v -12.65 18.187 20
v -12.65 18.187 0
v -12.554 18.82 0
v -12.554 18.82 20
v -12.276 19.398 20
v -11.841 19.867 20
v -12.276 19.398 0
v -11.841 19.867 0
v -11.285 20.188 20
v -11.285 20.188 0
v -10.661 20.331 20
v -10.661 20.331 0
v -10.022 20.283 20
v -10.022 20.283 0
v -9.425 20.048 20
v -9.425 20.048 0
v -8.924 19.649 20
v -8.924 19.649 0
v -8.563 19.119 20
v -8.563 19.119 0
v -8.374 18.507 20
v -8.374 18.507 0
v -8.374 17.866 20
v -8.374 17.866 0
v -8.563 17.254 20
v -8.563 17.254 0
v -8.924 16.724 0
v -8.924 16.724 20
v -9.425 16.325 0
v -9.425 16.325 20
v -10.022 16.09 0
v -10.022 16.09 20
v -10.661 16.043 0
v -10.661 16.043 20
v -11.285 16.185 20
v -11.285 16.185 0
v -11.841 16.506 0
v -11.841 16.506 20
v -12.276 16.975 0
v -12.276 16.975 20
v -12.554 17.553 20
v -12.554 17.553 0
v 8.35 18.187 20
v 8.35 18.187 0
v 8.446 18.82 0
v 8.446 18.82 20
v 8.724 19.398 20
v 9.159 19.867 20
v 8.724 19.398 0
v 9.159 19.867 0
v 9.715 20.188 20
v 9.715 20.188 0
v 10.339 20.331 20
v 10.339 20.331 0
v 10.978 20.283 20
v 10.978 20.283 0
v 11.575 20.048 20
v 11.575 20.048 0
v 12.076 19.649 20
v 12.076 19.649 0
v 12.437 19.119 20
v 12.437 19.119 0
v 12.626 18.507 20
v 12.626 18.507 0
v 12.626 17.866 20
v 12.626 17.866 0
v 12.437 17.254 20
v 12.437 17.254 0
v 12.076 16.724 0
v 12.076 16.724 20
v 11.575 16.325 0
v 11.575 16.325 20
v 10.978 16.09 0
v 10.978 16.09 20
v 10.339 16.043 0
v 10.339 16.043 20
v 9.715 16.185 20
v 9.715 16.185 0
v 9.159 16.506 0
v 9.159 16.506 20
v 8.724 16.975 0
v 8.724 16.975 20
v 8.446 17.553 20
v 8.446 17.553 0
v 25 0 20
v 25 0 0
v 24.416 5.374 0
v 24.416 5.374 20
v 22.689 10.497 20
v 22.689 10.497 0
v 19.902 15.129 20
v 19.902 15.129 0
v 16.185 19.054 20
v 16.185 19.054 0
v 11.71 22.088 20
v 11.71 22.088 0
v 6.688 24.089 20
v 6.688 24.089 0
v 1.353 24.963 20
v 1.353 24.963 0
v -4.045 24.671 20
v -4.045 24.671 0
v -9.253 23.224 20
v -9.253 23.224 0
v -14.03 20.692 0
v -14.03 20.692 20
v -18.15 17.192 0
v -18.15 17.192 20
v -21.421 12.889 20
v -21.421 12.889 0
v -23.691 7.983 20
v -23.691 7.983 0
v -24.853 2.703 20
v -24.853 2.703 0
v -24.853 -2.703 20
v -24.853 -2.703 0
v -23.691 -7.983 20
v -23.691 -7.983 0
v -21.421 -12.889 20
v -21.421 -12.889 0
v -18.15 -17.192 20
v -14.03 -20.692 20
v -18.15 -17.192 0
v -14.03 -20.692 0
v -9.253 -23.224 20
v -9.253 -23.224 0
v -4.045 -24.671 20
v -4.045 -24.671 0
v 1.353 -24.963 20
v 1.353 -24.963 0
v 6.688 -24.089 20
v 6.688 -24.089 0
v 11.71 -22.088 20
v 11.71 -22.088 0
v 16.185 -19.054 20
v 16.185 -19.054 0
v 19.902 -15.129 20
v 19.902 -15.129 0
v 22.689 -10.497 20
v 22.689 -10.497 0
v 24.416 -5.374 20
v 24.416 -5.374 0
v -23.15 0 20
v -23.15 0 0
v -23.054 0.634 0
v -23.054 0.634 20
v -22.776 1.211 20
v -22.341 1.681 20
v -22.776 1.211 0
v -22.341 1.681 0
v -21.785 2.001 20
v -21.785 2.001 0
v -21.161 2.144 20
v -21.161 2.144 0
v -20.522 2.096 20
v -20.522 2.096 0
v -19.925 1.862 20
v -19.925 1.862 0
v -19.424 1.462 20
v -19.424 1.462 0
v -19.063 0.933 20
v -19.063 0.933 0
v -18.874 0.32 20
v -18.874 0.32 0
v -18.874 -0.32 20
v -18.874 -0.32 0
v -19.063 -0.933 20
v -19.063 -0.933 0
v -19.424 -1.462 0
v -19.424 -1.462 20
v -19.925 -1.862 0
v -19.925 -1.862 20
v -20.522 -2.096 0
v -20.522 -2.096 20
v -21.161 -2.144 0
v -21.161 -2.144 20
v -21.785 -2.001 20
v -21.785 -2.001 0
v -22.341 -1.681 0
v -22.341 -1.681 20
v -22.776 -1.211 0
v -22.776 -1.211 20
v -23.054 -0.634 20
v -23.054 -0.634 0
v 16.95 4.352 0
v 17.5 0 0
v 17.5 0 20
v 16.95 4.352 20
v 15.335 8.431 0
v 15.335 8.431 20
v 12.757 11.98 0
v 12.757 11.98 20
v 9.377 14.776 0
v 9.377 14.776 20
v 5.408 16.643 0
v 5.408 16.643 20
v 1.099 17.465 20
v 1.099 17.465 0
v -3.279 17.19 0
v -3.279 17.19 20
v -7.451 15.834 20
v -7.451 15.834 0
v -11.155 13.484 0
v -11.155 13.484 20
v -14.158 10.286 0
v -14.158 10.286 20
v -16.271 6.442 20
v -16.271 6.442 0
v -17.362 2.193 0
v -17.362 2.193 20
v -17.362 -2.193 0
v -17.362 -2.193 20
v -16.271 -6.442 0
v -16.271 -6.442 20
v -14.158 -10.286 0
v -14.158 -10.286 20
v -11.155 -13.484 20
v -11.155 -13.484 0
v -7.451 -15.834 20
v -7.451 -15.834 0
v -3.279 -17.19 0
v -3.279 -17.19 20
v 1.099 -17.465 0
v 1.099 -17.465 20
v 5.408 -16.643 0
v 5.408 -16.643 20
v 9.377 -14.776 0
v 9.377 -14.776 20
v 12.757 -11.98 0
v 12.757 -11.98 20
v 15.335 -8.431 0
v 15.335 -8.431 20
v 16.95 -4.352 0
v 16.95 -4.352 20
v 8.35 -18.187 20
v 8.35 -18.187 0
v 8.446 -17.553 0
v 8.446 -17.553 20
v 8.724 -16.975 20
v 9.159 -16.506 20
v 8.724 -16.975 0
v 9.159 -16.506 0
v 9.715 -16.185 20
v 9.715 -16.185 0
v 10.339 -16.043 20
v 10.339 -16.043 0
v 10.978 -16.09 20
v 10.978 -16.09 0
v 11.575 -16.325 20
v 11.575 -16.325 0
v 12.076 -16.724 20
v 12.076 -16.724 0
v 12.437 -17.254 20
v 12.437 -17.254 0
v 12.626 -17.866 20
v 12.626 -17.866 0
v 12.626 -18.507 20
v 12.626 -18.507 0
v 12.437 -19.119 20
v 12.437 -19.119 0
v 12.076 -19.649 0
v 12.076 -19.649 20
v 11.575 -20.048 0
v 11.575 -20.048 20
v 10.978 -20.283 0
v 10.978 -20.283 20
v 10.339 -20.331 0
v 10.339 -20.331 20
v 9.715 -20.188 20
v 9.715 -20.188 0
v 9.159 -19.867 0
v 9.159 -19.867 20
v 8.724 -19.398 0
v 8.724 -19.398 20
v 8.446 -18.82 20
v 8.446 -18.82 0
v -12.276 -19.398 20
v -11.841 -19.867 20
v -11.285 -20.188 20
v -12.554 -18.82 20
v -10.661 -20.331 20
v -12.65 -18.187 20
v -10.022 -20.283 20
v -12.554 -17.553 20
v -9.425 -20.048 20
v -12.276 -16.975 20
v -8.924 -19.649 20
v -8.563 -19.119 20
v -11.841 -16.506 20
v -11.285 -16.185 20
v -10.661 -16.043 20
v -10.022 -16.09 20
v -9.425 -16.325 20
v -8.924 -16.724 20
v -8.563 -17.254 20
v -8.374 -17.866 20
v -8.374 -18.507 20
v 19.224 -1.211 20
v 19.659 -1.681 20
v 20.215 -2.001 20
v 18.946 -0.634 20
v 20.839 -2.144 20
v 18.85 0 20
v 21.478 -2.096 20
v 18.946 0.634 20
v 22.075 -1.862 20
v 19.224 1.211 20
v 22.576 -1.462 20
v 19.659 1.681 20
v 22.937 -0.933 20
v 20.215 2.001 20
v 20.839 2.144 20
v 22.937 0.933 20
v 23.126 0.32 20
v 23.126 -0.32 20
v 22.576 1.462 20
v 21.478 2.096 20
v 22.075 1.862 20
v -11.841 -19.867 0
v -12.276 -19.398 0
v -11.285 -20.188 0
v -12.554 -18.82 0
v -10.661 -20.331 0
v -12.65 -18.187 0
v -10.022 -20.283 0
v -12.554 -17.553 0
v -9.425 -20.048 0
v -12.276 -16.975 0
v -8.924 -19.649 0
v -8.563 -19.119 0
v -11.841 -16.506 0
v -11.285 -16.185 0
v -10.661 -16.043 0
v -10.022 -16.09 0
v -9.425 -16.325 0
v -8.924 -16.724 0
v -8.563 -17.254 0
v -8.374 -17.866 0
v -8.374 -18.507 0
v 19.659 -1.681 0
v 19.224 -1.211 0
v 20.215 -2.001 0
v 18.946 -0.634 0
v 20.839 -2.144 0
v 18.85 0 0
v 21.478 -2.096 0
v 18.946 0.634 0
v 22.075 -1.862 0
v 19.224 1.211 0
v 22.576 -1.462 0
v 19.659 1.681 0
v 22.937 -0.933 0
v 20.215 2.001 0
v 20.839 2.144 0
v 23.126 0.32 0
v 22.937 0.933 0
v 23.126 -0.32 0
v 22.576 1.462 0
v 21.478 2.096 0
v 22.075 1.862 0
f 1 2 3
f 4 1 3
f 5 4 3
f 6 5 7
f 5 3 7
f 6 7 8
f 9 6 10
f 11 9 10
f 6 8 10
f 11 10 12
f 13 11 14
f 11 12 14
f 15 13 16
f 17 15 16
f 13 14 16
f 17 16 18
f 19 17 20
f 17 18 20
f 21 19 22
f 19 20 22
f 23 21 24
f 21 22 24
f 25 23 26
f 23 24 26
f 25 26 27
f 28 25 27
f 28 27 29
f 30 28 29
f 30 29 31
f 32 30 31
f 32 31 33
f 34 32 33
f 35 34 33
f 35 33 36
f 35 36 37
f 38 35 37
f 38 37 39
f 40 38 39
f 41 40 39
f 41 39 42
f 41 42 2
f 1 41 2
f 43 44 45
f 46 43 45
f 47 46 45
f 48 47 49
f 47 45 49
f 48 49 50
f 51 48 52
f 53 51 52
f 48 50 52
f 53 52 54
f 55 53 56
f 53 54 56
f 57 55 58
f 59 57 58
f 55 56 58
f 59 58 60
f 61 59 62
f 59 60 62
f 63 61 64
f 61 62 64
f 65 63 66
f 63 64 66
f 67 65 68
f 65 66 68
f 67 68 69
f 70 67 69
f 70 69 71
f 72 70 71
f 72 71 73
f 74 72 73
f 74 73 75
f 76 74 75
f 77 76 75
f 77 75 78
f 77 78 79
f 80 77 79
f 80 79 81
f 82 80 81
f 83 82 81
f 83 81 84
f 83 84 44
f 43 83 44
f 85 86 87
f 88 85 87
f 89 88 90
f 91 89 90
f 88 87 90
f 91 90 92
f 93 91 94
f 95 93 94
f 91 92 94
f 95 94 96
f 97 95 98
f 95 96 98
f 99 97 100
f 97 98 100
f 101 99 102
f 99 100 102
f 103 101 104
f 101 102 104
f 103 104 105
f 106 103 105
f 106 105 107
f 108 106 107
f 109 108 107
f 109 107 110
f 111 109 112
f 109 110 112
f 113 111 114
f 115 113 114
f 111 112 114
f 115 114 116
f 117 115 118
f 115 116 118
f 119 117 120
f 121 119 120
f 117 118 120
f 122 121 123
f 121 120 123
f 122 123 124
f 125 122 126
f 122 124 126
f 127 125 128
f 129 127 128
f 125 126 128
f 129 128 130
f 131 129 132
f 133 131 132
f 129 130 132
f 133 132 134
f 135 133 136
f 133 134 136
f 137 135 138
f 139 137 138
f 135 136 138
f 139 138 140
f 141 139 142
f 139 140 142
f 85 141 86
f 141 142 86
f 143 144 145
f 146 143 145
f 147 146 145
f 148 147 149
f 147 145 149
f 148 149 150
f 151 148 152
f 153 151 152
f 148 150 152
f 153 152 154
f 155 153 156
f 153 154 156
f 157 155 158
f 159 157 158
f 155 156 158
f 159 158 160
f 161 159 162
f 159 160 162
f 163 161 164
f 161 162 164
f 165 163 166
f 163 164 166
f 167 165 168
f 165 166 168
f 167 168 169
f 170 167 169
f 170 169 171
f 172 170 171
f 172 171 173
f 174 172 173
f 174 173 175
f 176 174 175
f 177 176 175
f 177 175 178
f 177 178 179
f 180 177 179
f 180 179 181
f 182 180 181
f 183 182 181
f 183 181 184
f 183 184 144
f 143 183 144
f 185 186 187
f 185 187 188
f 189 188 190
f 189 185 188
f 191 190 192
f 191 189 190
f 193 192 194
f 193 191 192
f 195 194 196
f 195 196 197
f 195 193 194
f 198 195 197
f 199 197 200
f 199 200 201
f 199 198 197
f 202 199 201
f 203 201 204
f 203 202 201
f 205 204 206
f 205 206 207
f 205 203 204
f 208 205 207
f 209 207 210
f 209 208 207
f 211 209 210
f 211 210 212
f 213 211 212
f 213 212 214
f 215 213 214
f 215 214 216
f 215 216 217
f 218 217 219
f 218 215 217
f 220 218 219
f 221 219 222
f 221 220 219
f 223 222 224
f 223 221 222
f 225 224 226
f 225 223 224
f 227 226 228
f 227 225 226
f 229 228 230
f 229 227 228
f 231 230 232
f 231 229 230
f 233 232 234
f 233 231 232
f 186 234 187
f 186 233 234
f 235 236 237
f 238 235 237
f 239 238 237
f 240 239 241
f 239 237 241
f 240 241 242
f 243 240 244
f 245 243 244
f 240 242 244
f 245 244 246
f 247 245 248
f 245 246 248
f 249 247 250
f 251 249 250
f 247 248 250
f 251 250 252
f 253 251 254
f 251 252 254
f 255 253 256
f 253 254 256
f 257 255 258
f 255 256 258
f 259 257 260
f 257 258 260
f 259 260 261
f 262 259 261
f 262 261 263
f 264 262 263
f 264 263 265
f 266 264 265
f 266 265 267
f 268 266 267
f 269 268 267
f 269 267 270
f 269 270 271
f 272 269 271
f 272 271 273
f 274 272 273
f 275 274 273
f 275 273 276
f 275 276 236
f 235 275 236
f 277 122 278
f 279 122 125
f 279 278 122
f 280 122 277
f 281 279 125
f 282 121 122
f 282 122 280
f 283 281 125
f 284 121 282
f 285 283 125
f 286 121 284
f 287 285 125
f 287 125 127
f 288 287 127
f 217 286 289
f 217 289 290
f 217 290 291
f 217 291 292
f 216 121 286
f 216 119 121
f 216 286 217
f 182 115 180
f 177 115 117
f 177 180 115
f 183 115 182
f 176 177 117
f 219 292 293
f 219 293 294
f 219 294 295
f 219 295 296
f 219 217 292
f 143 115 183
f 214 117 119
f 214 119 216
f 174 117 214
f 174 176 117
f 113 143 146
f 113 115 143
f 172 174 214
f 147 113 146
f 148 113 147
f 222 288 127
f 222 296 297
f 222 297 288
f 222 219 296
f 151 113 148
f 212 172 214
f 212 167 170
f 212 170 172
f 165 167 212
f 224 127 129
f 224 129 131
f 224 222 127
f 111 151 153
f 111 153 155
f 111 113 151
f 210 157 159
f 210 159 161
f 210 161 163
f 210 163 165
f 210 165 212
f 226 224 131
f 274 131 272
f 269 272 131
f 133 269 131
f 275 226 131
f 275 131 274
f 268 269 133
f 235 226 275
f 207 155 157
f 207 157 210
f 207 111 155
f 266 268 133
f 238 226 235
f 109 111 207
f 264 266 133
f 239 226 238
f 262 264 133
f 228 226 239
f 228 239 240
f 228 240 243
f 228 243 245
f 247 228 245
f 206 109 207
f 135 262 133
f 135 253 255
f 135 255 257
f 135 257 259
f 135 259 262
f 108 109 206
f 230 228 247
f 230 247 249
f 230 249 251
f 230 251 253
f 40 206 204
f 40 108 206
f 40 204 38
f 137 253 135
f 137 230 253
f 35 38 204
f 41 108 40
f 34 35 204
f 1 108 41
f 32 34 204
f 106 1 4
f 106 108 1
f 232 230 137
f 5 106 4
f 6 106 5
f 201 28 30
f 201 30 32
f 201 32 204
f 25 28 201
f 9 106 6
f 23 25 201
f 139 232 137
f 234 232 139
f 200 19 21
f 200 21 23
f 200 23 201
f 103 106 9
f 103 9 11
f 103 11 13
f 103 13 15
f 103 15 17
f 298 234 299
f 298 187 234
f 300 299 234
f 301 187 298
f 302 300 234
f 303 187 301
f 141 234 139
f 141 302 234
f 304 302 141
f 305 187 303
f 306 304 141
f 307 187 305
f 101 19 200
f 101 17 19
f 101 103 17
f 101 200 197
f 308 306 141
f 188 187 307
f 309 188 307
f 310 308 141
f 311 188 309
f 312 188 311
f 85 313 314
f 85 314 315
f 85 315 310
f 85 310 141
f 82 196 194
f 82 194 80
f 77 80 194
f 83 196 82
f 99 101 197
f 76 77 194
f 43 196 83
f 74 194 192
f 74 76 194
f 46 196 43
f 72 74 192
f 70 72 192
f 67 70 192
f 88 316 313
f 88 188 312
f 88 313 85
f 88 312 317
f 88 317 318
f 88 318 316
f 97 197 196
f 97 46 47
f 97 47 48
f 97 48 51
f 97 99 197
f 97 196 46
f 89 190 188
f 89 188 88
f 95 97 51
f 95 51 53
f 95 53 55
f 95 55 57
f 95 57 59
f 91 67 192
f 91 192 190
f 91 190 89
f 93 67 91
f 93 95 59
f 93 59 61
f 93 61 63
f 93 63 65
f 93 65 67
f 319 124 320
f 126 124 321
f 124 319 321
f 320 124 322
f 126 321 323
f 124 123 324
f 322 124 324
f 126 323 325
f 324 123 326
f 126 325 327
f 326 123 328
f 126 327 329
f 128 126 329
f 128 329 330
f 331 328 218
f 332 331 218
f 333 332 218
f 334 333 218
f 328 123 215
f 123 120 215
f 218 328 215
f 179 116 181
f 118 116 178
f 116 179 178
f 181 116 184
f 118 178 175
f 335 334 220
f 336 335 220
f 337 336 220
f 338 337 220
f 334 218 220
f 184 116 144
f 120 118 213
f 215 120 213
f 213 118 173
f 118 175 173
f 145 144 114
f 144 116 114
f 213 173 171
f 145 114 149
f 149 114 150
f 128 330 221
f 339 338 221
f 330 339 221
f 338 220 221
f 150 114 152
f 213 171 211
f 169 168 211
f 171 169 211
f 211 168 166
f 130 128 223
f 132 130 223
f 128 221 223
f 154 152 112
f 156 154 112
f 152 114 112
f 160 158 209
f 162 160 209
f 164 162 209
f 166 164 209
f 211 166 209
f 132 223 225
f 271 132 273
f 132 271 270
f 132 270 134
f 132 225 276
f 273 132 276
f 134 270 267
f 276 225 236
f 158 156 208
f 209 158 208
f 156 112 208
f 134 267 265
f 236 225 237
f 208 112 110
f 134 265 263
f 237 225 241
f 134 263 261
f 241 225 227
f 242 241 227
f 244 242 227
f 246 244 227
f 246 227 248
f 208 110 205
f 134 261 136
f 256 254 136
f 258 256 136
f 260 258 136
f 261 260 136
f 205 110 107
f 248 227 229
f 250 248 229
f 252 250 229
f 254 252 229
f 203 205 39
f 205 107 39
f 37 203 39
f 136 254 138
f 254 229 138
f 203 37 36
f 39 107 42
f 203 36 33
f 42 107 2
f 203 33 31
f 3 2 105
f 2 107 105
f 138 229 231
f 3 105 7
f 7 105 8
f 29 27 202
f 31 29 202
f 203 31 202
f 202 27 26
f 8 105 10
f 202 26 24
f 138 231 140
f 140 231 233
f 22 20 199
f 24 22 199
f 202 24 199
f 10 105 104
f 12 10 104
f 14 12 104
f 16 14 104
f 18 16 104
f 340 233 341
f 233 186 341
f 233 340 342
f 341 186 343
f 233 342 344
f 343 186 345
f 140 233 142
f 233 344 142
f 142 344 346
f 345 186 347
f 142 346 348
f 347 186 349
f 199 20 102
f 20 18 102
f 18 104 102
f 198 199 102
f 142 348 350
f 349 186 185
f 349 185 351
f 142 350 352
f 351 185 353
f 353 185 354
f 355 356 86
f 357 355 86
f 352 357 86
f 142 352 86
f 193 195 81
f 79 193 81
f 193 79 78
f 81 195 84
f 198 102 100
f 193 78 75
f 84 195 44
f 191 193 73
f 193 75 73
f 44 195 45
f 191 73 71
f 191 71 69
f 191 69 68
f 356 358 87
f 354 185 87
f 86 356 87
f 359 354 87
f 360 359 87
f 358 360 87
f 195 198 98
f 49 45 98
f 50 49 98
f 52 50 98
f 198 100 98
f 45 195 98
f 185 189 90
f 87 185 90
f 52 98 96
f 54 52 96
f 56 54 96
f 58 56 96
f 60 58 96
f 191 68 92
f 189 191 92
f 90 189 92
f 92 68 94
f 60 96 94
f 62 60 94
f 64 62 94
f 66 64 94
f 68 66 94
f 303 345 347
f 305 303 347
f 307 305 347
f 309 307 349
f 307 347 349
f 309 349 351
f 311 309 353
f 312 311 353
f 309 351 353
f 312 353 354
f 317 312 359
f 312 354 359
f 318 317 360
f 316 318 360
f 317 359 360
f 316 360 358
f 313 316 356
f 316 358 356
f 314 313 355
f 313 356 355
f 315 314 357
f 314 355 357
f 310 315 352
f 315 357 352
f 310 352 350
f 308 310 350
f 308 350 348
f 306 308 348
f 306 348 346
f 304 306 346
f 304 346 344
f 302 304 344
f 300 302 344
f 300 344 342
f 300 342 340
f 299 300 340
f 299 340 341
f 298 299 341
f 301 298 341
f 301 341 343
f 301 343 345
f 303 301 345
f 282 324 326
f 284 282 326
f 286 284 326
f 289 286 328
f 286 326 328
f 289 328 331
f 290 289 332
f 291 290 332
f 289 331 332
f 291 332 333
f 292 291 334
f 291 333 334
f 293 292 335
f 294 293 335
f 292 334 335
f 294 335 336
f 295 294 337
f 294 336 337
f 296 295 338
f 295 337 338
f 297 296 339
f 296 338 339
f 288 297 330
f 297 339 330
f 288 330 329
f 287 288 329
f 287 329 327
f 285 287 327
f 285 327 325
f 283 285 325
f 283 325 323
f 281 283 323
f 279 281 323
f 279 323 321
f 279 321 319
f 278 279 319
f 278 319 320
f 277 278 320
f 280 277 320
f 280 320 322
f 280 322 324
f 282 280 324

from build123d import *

# Parameters (mm, degrees)
CROQUIS1_R                   = 25
CROQUIS1_R_2                 = 17.5
SALIENTE_EXTRUIR1_DEPTH      = 20
TALADRO_DE_MARGEN_PARA_M41_D = 4.3


with BuildPart() as part:
    # Croquis1 → Saliente-Extruir1 (new body)
    with BuildSketch(Plane.XY):
        Circle(CROQUIS1_R)
        Circle(CROQUIS1_R_2, mode=Mode.SUBTRACT)
    extrude(amount=SALIENTE_EXTRUIR1_DEPTH)

    # Taladro de margen para M41 (through all)
    with Locations(Plane.XY.offset(20)):
        with Locations((21, 0), (10.5, -18.186533479), (-10.5, -18.186533479), (-21, 0), (-10.5, 18.186533479), (10.5, 18.186533479)):
            Hole(TALADRO_DE_MARGEN_PARA_M41_D / 2)


solid = part.part
